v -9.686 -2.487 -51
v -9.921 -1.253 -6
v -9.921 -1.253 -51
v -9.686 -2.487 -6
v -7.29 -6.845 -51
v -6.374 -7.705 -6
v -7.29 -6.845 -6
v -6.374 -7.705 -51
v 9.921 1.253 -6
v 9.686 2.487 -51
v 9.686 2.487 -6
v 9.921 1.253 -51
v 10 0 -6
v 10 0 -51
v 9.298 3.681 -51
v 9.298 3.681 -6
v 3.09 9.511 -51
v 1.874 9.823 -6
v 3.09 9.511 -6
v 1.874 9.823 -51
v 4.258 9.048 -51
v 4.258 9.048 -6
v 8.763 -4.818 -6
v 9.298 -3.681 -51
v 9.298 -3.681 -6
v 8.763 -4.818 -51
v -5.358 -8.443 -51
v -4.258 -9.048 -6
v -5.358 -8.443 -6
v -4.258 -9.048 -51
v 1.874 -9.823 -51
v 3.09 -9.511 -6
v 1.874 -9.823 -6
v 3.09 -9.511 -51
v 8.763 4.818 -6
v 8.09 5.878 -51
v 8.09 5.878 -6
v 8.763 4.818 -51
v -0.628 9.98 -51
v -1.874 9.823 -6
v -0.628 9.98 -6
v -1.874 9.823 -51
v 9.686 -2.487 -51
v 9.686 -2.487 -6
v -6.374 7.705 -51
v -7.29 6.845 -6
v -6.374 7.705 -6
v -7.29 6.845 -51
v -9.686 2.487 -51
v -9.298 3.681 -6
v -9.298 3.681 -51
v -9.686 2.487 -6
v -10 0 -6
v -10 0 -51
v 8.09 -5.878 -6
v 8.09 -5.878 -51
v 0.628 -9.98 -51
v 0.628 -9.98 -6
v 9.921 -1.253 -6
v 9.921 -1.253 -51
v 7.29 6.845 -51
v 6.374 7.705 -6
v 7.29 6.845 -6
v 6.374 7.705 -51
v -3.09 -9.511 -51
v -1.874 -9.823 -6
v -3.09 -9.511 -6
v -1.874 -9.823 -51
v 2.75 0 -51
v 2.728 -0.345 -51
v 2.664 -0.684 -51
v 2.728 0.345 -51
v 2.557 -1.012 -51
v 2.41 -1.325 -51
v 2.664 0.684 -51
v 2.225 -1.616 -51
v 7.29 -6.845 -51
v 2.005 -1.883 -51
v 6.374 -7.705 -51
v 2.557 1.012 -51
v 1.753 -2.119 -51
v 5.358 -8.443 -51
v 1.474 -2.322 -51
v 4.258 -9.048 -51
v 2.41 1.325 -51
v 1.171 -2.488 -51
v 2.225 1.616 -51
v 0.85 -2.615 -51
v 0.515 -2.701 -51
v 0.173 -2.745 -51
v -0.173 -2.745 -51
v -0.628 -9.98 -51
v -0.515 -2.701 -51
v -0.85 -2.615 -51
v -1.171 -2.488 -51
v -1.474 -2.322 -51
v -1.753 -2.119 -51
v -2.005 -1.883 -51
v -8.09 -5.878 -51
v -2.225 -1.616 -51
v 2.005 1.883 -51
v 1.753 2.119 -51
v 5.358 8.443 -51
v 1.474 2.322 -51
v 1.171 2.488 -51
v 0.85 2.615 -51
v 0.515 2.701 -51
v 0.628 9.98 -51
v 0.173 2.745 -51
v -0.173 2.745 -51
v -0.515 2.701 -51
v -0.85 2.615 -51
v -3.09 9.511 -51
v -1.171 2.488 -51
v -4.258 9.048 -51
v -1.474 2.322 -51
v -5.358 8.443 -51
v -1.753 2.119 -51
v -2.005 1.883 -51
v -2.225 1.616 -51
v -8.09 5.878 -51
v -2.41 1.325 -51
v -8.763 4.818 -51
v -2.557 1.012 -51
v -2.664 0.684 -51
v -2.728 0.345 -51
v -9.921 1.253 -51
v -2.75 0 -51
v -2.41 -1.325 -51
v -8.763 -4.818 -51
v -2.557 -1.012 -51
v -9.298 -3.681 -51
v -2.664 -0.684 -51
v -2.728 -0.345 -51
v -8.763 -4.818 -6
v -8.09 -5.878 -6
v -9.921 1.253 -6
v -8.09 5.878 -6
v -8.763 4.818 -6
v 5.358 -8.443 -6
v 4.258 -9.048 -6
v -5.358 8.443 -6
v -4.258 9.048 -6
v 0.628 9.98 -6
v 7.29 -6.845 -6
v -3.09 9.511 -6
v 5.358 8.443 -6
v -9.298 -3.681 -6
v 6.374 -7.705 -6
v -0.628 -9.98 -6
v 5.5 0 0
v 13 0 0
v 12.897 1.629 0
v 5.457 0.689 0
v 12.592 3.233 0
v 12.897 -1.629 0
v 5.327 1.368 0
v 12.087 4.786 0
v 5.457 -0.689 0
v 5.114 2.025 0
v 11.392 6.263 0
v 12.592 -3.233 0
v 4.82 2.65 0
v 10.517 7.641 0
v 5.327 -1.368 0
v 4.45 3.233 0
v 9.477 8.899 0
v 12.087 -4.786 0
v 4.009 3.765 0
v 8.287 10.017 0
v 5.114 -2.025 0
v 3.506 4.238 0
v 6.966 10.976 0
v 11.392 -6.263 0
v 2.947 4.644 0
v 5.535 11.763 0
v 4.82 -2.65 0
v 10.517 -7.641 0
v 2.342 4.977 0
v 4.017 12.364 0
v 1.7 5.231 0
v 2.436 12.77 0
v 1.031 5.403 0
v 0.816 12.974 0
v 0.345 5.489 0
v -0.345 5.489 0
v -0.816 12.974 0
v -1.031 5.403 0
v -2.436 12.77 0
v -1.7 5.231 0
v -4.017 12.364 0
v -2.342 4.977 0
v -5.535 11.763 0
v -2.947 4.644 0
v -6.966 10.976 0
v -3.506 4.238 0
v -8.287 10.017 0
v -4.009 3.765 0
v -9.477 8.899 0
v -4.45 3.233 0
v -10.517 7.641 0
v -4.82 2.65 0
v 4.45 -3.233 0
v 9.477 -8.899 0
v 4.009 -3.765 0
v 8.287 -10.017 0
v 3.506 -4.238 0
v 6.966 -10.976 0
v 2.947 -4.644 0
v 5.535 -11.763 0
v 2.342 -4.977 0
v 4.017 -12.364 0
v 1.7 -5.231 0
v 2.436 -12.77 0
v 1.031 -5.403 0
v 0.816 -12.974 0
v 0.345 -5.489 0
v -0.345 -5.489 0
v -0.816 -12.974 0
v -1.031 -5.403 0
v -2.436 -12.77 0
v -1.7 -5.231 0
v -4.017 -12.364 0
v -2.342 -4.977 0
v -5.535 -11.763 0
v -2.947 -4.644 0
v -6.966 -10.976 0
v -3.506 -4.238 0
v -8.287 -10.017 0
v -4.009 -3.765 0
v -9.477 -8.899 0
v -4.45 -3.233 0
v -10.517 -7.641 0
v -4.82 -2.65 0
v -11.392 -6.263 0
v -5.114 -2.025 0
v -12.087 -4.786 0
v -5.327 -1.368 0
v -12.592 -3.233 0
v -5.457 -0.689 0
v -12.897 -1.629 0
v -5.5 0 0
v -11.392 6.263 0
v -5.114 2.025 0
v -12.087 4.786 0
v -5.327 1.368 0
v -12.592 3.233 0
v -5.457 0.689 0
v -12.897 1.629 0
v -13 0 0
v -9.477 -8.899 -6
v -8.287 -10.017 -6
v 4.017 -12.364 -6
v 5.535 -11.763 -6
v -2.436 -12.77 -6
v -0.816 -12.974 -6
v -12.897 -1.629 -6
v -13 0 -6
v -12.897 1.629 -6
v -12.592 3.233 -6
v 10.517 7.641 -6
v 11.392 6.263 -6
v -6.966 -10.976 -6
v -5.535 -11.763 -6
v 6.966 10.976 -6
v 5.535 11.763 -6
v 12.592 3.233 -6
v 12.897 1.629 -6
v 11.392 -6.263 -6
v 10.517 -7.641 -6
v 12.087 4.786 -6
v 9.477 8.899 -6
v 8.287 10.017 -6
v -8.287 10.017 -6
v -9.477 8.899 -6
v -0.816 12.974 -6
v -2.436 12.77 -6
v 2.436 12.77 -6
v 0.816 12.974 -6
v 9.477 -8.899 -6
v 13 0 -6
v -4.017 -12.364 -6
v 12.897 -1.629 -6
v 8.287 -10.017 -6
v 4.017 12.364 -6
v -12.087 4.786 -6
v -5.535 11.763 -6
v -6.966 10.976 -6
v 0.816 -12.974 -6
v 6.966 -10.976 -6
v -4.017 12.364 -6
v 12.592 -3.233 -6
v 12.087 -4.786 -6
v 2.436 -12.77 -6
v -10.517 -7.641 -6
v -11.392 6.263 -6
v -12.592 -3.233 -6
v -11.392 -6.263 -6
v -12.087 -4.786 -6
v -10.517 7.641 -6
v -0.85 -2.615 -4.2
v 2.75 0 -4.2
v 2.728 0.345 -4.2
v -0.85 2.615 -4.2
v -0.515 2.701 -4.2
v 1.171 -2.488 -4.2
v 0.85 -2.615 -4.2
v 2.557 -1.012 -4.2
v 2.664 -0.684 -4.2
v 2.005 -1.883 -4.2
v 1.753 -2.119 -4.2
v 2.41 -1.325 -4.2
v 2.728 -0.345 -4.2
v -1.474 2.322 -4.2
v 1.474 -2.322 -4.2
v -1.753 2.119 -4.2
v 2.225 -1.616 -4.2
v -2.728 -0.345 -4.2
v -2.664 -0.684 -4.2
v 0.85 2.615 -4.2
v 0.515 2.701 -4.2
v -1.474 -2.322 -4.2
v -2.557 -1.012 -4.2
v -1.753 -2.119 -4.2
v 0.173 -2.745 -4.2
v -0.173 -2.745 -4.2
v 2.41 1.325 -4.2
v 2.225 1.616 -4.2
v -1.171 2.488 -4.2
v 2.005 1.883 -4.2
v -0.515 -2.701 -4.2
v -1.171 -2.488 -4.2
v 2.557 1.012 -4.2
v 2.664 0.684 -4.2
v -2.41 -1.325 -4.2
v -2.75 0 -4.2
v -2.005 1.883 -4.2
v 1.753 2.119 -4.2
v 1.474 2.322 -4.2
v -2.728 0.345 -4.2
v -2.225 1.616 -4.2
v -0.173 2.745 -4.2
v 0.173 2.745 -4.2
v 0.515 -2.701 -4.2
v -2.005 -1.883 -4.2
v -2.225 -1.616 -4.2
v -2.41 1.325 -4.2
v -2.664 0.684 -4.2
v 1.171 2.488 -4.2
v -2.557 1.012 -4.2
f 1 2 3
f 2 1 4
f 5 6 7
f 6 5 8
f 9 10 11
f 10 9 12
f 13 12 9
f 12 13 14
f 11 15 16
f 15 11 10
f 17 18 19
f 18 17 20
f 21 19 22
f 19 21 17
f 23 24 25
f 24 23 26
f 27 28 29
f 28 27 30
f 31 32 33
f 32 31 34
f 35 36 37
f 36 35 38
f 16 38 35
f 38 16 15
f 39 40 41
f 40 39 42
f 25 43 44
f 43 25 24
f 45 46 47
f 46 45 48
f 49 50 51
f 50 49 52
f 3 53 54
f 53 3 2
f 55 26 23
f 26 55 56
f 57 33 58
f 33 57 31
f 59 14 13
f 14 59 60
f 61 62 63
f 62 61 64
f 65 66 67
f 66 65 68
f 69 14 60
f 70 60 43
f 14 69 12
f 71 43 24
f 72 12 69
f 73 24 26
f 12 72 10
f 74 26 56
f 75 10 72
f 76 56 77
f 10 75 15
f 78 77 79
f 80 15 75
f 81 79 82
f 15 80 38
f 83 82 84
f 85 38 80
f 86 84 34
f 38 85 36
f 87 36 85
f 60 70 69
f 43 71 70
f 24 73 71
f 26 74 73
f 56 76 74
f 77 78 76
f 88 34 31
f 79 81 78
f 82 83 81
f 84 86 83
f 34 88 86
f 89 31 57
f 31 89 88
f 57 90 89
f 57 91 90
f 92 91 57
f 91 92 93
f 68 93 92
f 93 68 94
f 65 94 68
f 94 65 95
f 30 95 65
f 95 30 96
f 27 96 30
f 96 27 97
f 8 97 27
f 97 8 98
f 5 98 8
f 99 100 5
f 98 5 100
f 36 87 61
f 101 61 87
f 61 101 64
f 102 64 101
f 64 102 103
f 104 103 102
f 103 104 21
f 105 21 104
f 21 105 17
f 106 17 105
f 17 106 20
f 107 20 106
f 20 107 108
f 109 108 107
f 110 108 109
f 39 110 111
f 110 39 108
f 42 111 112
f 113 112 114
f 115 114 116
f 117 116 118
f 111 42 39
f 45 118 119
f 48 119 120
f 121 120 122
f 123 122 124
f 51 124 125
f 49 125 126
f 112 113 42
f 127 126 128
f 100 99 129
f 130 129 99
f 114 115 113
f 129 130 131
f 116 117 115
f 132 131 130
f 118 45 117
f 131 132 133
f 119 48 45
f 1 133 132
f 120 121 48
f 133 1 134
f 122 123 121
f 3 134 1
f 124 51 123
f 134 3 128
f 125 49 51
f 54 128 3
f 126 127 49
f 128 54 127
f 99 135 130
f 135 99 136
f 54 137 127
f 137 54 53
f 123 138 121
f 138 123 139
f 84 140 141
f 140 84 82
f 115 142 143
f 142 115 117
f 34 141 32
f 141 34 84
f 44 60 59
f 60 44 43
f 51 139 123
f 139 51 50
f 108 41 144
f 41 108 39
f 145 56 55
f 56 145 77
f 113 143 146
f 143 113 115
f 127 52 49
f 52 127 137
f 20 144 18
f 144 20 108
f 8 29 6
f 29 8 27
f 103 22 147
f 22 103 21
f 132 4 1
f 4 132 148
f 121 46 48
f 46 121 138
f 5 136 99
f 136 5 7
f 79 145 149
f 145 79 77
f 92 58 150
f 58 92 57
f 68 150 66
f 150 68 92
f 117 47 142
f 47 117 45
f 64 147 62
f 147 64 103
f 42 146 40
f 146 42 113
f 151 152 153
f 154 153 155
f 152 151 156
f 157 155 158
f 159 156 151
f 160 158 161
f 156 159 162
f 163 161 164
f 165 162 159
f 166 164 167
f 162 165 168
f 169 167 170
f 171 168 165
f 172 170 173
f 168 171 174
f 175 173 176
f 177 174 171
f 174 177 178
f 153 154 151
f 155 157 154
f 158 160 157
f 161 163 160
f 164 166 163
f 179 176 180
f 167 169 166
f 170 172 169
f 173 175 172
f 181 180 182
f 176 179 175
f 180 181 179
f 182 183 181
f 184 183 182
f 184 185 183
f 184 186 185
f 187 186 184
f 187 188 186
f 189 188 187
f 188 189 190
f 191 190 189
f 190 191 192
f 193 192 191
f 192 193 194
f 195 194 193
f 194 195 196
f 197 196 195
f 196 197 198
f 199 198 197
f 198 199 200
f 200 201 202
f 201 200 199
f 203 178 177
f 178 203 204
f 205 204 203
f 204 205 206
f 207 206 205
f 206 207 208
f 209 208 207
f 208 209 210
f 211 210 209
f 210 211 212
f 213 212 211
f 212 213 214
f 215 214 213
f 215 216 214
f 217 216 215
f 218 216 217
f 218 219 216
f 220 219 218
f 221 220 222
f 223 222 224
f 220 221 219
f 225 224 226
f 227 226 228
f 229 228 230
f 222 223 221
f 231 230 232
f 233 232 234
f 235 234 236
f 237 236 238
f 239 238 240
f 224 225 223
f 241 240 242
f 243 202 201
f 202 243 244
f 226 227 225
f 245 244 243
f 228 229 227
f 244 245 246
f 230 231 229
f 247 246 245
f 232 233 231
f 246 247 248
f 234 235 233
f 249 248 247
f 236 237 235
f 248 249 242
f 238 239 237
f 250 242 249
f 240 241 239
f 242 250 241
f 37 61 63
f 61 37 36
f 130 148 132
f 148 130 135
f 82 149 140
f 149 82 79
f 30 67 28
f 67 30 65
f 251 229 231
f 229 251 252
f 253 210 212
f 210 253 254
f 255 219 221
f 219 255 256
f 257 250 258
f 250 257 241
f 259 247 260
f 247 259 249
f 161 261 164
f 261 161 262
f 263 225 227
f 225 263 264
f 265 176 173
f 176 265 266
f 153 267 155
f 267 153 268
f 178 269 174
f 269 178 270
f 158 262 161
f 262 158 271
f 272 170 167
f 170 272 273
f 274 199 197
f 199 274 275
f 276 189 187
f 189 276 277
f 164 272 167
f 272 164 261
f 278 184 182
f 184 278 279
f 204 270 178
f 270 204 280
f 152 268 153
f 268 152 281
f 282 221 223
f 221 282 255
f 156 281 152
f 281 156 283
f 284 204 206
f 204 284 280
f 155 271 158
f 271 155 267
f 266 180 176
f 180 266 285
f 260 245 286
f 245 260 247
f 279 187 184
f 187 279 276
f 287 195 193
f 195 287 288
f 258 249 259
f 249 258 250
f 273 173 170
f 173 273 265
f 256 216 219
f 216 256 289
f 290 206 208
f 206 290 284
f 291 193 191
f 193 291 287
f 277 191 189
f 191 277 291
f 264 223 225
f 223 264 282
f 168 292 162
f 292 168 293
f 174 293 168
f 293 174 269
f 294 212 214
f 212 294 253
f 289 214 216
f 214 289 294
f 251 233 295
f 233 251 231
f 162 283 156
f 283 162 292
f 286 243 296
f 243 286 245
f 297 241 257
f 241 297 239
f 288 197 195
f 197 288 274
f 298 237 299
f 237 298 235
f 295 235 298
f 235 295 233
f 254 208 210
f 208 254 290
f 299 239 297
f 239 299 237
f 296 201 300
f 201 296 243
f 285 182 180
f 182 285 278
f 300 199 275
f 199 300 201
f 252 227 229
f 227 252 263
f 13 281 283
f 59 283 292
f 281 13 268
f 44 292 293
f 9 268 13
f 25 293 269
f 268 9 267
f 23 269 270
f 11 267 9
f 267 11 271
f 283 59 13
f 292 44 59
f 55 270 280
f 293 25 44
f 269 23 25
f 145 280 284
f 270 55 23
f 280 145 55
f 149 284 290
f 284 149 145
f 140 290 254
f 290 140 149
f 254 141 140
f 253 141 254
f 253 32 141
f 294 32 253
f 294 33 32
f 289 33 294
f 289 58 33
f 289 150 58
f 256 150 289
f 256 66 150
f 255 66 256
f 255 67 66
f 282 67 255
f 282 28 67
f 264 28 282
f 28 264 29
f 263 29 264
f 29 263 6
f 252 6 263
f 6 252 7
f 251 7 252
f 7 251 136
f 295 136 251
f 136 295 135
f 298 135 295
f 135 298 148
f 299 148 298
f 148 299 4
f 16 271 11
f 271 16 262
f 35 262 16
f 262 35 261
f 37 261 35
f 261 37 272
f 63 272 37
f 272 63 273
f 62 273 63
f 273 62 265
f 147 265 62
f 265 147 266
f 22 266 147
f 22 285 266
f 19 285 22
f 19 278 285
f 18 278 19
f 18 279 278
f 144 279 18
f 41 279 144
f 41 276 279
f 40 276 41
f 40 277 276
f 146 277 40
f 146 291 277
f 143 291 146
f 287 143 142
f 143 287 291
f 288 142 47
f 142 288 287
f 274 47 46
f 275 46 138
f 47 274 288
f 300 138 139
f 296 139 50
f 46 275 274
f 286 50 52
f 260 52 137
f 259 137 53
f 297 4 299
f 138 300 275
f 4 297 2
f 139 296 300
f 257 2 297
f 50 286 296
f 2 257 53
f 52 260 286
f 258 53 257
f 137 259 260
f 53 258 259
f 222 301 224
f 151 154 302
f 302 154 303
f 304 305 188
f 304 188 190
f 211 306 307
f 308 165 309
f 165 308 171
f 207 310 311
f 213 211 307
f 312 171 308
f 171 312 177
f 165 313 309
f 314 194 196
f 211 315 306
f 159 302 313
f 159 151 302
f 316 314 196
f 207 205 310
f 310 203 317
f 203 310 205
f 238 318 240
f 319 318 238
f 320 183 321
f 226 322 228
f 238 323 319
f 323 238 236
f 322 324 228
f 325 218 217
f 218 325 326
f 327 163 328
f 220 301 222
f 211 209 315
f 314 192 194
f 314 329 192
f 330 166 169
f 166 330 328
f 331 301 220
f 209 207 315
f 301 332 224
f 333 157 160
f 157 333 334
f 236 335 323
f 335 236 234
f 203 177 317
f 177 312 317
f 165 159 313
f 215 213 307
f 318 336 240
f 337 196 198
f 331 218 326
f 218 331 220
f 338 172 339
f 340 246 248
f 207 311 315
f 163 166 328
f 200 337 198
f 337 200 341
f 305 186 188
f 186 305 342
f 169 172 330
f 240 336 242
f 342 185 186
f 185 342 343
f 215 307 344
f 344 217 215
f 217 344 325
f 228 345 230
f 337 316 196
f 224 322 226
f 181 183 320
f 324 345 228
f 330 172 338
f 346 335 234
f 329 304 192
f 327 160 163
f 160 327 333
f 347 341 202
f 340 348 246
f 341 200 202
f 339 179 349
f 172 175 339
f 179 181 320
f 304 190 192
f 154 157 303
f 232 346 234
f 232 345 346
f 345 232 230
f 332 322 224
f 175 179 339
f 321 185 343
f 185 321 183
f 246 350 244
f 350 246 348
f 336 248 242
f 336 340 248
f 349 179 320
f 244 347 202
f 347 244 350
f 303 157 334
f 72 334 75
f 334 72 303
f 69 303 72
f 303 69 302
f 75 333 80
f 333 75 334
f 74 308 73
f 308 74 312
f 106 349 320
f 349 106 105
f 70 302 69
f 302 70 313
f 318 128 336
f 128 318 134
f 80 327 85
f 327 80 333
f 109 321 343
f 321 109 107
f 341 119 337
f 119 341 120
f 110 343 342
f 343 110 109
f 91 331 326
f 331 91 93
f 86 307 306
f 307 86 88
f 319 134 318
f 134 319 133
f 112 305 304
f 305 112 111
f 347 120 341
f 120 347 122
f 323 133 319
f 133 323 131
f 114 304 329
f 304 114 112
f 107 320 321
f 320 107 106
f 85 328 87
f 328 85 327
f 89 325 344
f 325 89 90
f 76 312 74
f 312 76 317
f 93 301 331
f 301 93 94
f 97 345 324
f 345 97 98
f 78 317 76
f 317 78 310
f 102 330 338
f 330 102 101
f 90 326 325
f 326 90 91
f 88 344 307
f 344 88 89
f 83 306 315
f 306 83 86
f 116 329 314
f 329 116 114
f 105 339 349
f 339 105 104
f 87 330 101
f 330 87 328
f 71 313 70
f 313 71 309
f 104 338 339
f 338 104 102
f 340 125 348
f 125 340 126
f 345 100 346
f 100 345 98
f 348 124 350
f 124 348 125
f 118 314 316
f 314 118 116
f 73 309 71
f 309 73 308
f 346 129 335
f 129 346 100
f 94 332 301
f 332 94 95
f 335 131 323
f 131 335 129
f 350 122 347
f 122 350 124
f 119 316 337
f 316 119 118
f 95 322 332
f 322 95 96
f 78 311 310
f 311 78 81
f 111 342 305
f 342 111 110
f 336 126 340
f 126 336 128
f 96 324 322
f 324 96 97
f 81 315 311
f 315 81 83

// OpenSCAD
$fn = 50;


difference() {
	union() {
		translate(v = [0, 0, -51.0000000000]) {
			cylinder(h = 51, r = 10.0000000000);
		}
		translate(v = [0, 0, -6.0000000000]) {
			cylinder(h = 6, r = 13.0000000000);
		}
	}
	union() {
		translate(v = [0, 0, 0]) {
			rotate(a = [0, 0, 0]) {
				difference() {
					union() {
						#translate(v = [0, 0, -51.0000000000]) {
							cylinder(h = 51, r = 2.2500000000);
						}
						#translate(v = [0, 0, -4.2000000000]) {
							cylinder(h = 4.2000000000, r1 = 2.7500000000, r2 = 5.5000000000);
						}
						#translate(v = [0, 0, -51.0000000000]) {
							cylinder(h = 51, r = 2.7500000000);
						}
						#translate(v = [0, 0, -51.0000000000]) {
							cylinder(h = 51, r = 2.2500000000);
						}
					}
					union();
				}
			}
		}
	}
}
